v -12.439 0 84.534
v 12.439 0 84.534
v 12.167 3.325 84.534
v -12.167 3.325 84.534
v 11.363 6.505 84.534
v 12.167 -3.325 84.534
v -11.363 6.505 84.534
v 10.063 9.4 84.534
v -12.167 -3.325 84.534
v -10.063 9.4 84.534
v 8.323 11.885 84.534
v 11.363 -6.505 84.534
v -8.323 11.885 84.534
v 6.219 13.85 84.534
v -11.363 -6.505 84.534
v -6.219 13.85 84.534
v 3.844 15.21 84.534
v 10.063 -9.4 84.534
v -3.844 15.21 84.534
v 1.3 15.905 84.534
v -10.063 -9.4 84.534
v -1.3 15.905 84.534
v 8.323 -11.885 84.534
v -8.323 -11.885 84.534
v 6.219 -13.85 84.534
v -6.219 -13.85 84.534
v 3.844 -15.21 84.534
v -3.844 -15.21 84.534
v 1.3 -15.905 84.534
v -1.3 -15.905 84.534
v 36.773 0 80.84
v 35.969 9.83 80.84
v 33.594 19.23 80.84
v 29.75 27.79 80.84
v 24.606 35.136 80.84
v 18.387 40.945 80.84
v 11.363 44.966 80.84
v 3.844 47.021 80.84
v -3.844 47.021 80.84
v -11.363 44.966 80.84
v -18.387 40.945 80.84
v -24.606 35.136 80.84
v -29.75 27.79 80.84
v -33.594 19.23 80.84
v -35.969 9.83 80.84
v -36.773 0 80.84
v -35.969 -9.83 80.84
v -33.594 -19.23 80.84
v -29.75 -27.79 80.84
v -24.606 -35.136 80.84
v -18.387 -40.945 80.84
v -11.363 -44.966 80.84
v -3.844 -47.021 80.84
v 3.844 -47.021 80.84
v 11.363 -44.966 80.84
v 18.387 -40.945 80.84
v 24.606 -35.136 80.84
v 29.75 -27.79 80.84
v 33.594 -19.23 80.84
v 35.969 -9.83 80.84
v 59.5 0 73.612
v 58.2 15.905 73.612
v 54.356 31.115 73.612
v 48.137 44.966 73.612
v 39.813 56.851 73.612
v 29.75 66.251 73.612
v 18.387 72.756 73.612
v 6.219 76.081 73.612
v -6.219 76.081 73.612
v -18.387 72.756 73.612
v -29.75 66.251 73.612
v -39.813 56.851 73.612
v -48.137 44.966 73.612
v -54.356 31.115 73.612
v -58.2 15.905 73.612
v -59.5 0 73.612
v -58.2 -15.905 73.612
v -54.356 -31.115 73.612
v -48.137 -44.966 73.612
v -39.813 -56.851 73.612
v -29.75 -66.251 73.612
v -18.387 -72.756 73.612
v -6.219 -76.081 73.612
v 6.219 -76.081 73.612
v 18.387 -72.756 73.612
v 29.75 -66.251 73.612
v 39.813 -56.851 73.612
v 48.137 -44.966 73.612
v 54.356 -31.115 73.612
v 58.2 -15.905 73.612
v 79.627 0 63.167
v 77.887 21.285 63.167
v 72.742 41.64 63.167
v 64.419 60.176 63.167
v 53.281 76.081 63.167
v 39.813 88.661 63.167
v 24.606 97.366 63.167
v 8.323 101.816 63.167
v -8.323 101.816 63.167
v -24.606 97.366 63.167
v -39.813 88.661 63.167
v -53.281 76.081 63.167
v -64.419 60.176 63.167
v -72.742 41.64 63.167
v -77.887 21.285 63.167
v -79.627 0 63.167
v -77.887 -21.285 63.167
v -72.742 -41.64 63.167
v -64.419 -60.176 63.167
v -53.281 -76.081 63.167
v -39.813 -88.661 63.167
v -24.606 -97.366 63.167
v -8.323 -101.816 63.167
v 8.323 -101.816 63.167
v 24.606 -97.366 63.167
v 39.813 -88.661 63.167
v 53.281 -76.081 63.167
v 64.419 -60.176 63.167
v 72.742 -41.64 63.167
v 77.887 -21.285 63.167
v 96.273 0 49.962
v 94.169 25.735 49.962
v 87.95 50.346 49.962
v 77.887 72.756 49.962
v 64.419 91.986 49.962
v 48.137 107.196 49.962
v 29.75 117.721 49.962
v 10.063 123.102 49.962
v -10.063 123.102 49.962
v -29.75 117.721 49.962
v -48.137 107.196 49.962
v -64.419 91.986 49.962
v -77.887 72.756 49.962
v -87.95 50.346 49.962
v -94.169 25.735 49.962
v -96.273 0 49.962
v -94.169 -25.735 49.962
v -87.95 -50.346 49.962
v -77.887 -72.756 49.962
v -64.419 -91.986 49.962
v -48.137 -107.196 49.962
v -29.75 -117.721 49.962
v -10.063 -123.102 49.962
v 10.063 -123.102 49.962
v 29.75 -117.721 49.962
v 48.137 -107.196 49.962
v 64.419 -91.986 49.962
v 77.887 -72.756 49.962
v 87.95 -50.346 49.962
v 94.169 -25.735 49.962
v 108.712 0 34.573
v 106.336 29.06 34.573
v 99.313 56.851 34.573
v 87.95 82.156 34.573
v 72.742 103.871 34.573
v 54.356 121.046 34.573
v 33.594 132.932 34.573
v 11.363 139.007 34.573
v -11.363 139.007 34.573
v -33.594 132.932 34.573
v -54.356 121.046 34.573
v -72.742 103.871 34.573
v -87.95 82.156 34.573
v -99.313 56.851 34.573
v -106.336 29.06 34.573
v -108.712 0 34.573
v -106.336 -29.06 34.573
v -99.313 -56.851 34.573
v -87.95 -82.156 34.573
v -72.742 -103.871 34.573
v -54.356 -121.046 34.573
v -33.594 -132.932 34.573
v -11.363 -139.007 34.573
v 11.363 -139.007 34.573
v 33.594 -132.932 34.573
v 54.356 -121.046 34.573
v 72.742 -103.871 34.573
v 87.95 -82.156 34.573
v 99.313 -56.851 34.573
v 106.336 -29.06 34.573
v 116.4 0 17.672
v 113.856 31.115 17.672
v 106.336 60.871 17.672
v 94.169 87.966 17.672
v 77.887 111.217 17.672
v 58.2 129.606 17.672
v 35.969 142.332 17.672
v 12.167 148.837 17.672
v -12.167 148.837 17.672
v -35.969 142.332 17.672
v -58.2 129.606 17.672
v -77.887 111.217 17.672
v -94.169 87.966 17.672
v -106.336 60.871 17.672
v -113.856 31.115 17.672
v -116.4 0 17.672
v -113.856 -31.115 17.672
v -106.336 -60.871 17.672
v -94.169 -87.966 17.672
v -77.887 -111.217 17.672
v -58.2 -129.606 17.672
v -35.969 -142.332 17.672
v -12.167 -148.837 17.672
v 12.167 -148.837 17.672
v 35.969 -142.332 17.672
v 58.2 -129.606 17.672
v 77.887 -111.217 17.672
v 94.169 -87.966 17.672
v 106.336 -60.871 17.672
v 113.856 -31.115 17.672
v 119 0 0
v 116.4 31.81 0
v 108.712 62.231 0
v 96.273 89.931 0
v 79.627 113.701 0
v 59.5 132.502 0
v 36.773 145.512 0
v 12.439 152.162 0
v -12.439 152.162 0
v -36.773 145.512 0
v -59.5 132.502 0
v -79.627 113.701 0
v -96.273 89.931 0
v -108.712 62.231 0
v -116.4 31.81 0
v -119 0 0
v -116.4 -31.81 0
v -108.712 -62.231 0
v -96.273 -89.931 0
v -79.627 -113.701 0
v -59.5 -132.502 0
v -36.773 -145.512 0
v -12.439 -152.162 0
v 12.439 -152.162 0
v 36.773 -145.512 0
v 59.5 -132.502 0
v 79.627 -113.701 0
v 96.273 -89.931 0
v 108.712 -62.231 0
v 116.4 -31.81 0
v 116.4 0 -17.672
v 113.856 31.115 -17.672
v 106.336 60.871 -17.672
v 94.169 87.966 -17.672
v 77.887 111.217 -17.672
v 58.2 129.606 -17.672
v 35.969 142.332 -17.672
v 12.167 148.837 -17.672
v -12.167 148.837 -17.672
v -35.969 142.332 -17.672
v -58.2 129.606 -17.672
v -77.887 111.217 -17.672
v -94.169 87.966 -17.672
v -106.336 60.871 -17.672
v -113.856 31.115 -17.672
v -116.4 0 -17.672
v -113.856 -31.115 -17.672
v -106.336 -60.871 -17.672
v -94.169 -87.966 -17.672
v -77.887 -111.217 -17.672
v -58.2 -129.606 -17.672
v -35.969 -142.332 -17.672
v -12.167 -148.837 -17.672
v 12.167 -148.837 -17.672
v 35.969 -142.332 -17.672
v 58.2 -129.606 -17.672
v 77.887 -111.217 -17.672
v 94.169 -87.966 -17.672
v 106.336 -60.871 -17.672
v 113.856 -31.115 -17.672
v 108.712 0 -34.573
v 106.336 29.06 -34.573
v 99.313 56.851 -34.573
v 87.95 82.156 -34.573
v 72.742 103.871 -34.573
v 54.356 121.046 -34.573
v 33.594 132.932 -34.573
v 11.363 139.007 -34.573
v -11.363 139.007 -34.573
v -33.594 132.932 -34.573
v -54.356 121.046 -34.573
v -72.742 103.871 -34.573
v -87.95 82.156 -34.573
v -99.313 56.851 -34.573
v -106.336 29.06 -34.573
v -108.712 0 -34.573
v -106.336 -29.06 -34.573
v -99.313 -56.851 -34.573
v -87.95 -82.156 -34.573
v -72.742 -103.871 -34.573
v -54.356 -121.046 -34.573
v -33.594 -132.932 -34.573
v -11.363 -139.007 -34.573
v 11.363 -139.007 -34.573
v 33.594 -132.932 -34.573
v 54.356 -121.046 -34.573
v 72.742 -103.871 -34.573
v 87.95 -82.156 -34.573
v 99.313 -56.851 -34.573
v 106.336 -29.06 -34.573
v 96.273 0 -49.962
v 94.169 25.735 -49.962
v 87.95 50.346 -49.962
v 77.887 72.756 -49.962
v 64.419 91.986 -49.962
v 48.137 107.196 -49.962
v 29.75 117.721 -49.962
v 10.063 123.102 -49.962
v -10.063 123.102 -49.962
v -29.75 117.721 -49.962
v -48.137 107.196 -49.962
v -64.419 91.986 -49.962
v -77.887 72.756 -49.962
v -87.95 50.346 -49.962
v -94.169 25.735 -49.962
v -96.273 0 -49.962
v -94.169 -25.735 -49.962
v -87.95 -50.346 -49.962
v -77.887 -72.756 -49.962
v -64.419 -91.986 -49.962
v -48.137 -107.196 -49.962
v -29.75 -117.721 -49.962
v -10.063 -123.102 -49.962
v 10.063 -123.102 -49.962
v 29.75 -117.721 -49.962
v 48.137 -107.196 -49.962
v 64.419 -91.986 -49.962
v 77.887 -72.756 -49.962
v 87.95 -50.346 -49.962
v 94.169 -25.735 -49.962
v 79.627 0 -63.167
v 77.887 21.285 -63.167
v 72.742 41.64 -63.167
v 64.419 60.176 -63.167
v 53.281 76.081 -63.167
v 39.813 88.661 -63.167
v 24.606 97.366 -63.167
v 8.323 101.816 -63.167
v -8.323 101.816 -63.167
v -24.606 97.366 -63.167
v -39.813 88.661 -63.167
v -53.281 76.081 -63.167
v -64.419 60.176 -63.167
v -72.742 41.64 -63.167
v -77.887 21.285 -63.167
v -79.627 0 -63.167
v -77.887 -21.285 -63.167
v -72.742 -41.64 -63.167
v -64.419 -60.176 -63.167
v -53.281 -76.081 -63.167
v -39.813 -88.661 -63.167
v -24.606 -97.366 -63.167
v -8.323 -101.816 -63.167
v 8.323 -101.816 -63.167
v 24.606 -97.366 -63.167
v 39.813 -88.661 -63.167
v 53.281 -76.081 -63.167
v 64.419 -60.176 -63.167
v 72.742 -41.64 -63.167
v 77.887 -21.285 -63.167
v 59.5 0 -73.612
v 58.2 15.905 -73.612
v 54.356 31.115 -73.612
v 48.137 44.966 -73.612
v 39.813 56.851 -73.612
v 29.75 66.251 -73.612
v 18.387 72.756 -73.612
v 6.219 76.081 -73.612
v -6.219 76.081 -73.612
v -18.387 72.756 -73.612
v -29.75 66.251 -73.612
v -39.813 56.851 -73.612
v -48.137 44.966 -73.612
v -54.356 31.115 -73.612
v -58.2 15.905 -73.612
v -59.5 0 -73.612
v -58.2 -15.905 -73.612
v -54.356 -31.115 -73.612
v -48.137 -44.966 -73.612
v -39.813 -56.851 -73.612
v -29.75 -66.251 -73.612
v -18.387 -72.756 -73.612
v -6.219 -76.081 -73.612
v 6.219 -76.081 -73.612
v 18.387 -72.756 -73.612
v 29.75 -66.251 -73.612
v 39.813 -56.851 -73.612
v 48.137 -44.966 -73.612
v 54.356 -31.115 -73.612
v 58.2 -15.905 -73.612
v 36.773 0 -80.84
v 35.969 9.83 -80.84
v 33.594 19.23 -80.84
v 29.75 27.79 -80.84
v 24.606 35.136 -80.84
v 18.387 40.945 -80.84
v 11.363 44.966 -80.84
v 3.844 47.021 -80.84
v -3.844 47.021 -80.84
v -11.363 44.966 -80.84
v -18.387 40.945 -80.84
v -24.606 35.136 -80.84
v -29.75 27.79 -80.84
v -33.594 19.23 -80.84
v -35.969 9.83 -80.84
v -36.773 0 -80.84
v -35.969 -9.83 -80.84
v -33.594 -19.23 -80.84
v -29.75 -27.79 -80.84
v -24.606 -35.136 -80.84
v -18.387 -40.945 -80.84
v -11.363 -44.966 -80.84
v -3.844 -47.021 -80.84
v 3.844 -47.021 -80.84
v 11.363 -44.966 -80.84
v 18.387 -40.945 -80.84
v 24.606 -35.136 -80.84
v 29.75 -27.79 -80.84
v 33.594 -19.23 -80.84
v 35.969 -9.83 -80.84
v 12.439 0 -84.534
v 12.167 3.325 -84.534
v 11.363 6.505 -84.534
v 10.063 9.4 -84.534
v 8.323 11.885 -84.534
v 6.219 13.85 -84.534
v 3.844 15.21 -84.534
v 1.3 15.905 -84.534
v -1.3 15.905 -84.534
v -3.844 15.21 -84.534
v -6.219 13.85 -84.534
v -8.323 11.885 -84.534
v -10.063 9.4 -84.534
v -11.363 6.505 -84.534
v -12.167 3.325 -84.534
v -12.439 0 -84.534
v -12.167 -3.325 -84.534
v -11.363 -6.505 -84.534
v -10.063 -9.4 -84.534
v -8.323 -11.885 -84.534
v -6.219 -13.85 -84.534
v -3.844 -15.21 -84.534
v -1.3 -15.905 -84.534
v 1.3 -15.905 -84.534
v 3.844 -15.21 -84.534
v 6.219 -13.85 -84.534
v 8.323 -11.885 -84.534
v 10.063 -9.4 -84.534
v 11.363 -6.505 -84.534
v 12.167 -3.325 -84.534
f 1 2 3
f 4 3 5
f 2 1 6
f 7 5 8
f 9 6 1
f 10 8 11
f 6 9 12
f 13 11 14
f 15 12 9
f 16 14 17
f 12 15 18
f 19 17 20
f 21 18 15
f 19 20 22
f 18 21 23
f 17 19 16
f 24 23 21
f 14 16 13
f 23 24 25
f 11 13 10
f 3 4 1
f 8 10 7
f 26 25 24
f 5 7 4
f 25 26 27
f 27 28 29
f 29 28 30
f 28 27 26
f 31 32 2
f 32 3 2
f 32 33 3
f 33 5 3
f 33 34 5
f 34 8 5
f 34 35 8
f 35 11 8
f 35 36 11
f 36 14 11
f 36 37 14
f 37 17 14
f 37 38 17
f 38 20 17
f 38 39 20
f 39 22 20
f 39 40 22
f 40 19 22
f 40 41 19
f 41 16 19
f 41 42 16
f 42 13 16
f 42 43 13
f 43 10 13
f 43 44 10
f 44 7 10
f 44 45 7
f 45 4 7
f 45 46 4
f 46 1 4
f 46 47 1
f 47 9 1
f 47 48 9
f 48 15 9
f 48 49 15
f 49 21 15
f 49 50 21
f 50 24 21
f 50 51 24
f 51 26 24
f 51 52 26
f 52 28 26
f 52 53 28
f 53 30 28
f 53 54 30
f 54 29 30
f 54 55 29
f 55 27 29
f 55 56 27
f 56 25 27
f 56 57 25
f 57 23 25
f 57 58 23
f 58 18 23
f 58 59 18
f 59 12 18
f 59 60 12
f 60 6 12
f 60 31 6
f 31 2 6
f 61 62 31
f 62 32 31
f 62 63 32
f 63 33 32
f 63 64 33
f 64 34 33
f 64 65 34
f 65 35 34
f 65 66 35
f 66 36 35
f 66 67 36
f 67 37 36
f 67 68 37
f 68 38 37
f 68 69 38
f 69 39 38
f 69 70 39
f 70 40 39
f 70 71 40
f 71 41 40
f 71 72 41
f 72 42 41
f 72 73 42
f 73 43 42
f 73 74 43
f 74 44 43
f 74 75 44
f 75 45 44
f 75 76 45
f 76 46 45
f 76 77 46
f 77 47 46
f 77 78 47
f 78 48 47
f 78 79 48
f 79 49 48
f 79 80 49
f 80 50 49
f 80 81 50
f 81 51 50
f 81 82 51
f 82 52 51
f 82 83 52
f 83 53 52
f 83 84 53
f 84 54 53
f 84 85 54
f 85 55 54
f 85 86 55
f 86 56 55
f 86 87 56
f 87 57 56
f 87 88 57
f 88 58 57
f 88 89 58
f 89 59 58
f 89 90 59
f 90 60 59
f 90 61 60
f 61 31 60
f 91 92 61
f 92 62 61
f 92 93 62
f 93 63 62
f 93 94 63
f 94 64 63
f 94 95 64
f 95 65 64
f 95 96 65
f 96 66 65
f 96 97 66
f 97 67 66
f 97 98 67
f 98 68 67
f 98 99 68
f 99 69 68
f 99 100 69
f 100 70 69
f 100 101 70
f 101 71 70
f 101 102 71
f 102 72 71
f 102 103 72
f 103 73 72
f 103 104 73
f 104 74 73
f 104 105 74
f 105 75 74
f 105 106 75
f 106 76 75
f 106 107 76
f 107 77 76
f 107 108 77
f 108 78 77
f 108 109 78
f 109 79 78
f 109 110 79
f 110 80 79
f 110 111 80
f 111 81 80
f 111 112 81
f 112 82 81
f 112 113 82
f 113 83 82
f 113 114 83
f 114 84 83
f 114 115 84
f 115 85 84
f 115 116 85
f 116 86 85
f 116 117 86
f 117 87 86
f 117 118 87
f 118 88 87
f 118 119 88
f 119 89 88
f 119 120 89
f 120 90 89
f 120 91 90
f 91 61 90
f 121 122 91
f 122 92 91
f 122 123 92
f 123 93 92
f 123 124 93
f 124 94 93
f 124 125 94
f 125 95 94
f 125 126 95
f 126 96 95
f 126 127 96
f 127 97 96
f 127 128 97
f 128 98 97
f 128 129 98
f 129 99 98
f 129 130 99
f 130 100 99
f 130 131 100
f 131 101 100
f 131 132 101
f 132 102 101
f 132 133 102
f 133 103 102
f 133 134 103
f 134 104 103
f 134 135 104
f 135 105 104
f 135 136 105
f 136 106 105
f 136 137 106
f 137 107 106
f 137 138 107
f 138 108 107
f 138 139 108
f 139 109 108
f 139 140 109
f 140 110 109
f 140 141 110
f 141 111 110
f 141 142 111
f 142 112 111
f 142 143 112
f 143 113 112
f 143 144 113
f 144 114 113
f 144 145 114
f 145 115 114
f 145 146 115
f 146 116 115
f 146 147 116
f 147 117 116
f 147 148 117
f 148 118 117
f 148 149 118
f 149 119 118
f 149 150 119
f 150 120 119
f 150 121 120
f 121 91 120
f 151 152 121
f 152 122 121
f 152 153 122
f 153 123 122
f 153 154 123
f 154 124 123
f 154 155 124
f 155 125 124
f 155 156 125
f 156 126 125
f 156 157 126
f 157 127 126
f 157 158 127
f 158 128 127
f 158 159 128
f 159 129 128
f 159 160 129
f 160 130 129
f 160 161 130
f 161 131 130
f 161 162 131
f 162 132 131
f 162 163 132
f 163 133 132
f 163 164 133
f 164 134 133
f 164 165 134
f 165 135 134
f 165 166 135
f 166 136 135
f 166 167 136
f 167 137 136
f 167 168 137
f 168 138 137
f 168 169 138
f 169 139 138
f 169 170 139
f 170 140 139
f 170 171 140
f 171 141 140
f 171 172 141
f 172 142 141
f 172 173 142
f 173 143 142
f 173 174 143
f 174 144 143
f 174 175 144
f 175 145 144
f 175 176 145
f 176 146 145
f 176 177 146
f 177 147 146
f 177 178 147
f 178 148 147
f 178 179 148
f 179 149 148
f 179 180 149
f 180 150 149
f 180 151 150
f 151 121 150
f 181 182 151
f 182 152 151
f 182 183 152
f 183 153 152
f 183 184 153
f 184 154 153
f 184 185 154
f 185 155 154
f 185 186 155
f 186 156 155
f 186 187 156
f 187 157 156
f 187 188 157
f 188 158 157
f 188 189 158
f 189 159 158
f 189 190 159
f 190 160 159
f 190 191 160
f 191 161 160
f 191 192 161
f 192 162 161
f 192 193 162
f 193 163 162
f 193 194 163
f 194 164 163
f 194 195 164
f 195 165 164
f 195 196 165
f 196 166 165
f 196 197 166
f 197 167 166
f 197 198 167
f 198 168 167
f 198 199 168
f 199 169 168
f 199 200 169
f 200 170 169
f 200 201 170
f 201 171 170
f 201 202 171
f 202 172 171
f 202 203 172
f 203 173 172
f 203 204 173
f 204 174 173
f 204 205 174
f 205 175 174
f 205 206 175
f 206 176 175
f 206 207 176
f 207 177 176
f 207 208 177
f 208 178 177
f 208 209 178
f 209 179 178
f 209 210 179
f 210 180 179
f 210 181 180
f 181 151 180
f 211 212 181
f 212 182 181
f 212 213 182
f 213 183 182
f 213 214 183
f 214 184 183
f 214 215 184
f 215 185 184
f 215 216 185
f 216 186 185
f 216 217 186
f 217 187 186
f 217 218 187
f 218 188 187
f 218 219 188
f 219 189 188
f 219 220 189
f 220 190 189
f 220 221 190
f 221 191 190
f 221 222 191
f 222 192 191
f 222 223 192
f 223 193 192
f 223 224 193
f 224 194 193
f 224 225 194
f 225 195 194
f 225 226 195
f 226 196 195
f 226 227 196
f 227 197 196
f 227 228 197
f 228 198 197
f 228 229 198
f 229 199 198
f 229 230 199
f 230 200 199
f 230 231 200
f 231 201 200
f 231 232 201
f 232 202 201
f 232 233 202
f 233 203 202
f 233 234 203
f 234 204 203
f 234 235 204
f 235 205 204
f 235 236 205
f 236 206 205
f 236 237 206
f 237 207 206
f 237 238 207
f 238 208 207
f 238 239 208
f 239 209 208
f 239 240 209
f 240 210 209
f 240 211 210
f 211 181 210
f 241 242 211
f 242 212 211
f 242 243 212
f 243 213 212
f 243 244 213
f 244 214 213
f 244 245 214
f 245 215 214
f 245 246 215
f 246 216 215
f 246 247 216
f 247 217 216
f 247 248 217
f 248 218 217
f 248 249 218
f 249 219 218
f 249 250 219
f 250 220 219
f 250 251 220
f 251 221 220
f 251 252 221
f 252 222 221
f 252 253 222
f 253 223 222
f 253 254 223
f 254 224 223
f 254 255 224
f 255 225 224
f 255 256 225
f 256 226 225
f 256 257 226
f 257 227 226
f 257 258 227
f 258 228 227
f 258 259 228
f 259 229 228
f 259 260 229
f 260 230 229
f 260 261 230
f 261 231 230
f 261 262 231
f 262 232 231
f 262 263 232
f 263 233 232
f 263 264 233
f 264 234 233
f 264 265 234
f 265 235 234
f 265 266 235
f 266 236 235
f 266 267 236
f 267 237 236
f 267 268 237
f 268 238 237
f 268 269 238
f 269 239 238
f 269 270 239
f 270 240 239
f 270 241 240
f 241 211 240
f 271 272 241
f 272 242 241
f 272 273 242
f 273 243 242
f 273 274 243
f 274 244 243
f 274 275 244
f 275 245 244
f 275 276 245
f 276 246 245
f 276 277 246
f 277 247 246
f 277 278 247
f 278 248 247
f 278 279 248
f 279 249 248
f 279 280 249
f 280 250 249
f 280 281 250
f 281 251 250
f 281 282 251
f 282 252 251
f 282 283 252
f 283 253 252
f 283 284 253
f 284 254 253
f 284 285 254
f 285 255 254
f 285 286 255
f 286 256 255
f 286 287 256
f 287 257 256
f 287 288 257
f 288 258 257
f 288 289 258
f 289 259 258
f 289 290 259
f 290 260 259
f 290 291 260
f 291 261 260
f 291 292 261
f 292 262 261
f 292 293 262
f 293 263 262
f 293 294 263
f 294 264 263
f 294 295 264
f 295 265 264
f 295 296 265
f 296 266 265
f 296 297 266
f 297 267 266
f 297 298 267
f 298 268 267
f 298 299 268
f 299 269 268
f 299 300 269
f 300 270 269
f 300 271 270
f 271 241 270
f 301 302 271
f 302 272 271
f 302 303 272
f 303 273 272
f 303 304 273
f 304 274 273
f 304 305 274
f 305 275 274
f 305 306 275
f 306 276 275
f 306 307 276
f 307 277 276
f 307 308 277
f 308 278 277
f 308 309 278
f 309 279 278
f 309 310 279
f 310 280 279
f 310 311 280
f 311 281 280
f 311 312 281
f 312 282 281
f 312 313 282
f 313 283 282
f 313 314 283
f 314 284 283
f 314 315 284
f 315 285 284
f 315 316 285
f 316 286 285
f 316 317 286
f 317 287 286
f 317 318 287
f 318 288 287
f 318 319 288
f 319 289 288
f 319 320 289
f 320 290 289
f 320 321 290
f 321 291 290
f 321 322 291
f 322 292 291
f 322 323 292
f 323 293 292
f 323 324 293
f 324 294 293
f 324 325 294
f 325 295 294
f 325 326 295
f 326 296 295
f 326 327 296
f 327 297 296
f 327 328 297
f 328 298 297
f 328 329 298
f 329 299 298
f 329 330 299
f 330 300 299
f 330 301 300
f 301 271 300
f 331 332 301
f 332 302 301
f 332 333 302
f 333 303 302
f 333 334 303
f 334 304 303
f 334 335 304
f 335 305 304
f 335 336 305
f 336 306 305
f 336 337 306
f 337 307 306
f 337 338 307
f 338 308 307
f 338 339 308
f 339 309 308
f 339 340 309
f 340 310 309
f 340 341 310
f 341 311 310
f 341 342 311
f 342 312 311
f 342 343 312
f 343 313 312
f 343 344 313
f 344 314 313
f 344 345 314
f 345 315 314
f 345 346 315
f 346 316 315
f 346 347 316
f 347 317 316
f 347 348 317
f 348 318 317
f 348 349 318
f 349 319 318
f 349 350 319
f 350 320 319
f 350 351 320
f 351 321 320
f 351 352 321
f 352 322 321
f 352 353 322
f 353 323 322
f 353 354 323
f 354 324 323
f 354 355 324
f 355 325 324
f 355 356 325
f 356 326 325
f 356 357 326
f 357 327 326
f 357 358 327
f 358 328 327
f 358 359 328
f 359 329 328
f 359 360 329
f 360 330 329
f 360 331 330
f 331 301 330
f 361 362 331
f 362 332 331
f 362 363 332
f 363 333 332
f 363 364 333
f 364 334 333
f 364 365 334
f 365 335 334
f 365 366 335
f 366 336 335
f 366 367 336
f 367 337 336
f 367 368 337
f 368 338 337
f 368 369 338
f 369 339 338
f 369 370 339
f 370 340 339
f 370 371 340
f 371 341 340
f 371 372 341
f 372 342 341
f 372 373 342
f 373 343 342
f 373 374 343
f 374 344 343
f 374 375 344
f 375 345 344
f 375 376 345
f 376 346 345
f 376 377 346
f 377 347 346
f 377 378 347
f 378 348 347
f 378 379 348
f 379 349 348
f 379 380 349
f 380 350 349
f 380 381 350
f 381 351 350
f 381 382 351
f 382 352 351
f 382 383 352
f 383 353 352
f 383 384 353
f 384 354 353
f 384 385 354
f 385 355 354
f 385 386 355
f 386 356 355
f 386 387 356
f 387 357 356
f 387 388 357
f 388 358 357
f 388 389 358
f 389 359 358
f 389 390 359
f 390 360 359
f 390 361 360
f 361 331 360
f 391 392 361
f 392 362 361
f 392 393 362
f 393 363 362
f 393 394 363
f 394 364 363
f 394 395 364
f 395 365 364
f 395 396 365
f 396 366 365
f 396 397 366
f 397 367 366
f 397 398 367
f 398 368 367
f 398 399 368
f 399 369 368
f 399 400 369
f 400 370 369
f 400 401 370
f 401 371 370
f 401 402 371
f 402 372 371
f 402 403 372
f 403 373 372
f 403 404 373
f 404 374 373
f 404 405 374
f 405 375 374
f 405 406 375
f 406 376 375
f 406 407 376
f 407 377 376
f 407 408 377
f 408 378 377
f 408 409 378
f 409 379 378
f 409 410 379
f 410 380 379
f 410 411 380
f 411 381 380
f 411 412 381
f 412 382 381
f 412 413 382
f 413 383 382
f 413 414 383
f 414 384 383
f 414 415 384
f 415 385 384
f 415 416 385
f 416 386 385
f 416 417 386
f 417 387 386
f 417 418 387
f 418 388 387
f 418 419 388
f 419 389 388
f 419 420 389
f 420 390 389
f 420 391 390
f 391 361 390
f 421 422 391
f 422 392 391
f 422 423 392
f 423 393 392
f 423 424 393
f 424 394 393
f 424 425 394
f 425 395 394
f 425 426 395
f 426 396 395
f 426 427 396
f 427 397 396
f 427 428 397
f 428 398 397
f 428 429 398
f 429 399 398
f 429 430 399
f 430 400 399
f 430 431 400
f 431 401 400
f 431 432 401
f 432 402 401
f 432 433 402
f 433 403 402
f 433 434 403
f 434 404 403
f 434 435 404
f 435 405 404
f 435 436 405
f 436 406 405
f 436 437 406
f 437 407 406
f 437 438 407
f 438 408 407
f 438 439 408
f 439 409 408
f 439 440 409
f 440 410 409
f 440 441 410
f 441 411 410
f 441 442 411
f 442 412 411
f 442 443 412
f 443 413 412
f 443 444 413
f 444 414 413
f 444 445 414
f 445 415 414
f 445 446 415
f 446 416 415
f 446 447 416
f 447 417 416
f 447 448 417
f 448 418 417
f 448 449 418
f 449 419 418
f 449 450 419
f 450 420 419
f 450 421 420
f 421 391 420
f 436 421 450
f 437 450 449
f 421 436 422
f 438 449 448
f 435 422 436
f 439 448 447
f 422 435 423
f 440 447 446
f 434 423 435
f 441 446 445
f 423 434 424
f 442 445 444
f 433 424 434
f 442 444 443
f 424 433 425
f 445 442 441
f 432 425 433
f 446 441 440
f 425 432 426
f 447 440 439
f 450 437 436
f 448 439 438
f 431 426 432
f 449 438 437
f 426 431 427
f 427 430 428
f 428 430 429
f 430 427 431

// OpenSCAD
// Generated by SolidPython 1.0.1 on 2020-07-29 00:46:47


scale(v = [7, 9, 5]) {
	sphere(r = 17);
}
/***********************************************
*********      SolidPython code:      **********
************************************************
 
# import packages: SolidPython
from solid import *
from solid.utils import *
from itertools import chain, combinations, permutations


class Resize:

    def __init__(self, scad_file):
        self.scad_file = scad_file
        #self.scad_file = import_scad(scad_file)
        # cone/cylinder param:
        self.r1 = 0
        self.r2 = 0
        self.h = 0
        # rectangular prism param:
        self.w = 0
        self.l = 0
        # ellipse param:
        self.r = 0

    # import OpenScad code (file name corresponds to shape)


    # classify shape + parameters
    def assign(self, param1, param2, param3):
        if self.scad_file == 'cone.scad':
            self.r1 = param1
            self.r2 = param2
            self.h = param3
        elif self.scad_file == 'cylinder.scad':
            self.r1 = param1
            self.r2 = param2
            self.h = param3
        elif self.scad_file == 'rectangularPrism.scad':
            self.h = param1
            self.l = param2
            self.w = param3
        else:
            self.r = param1
            self.h = param2

    # resize parameters
    def iterate(self):
        x = range(3, 20, 2)
        i = 1
        if self.scad_file == 'cone.scad':
            tempList = list(permutations(x, 2))
            for temp in tempList:
                param1 = temp[0]
                param2 = temp[1]
                filepath = 'produced_scad_files/' + 'cone' + str(param1) + '_' + str(param2) + '_' + '.scad'
                scad_render_to_file(cylinder(h=param1, r1=param2, r2=0), filepath)

        elif self.scad_file == 'cylinder.scad':
            tempList = list(permutations(x, 3))
            for temp in tempList:
                param1 = temp[0]
                param2 = temp[1]
                filepath = 'produced_scad_files/' + 'cylinder' + str(param1) + '_' + str(param2) + '_' + '.scad'
                scad_render_to_file(cylinder(h=param1, r1=param2, r2=param2), filepath)

        elif self.scad_file == 'rectangularPrism.scad':
            tempList = list(permutations(x, 3))
            for temp in tempList:
                param1 = temp[0]
                param2 = temp[1]
                param3 = temp[2]
                filepath = 'produced_scad_files/' + 'rectangularPrism' + str(param1) + '_' + str(param2) + '_' + str(
                    param3) + '.scad'
                scad_render_to_file(cube(size=(param1, param2, param3)), filepath)

        elif self.scad_file == 'ellipse.scad':
            tempList = list(permutations(x, 4))
            for temp in tempList:
                param1 = temp[0]
                param2 = temp[1]
                param3 = temp[2]
                param4 = temp[3]
                filepath = 'produced_scad_files/' + 'ellipse' + str(param1) + '_' + str(param2) + '_' + str(param3) + '_' + str(param4) + '.scad'
                scad_render_to_file(scale([param1, param2, param3])(sphere(r=param4)), filepath)

    def render_to_scadfile(self):
        scad_render_to_file(scad, 'example.scad') 
 
************************************************/
